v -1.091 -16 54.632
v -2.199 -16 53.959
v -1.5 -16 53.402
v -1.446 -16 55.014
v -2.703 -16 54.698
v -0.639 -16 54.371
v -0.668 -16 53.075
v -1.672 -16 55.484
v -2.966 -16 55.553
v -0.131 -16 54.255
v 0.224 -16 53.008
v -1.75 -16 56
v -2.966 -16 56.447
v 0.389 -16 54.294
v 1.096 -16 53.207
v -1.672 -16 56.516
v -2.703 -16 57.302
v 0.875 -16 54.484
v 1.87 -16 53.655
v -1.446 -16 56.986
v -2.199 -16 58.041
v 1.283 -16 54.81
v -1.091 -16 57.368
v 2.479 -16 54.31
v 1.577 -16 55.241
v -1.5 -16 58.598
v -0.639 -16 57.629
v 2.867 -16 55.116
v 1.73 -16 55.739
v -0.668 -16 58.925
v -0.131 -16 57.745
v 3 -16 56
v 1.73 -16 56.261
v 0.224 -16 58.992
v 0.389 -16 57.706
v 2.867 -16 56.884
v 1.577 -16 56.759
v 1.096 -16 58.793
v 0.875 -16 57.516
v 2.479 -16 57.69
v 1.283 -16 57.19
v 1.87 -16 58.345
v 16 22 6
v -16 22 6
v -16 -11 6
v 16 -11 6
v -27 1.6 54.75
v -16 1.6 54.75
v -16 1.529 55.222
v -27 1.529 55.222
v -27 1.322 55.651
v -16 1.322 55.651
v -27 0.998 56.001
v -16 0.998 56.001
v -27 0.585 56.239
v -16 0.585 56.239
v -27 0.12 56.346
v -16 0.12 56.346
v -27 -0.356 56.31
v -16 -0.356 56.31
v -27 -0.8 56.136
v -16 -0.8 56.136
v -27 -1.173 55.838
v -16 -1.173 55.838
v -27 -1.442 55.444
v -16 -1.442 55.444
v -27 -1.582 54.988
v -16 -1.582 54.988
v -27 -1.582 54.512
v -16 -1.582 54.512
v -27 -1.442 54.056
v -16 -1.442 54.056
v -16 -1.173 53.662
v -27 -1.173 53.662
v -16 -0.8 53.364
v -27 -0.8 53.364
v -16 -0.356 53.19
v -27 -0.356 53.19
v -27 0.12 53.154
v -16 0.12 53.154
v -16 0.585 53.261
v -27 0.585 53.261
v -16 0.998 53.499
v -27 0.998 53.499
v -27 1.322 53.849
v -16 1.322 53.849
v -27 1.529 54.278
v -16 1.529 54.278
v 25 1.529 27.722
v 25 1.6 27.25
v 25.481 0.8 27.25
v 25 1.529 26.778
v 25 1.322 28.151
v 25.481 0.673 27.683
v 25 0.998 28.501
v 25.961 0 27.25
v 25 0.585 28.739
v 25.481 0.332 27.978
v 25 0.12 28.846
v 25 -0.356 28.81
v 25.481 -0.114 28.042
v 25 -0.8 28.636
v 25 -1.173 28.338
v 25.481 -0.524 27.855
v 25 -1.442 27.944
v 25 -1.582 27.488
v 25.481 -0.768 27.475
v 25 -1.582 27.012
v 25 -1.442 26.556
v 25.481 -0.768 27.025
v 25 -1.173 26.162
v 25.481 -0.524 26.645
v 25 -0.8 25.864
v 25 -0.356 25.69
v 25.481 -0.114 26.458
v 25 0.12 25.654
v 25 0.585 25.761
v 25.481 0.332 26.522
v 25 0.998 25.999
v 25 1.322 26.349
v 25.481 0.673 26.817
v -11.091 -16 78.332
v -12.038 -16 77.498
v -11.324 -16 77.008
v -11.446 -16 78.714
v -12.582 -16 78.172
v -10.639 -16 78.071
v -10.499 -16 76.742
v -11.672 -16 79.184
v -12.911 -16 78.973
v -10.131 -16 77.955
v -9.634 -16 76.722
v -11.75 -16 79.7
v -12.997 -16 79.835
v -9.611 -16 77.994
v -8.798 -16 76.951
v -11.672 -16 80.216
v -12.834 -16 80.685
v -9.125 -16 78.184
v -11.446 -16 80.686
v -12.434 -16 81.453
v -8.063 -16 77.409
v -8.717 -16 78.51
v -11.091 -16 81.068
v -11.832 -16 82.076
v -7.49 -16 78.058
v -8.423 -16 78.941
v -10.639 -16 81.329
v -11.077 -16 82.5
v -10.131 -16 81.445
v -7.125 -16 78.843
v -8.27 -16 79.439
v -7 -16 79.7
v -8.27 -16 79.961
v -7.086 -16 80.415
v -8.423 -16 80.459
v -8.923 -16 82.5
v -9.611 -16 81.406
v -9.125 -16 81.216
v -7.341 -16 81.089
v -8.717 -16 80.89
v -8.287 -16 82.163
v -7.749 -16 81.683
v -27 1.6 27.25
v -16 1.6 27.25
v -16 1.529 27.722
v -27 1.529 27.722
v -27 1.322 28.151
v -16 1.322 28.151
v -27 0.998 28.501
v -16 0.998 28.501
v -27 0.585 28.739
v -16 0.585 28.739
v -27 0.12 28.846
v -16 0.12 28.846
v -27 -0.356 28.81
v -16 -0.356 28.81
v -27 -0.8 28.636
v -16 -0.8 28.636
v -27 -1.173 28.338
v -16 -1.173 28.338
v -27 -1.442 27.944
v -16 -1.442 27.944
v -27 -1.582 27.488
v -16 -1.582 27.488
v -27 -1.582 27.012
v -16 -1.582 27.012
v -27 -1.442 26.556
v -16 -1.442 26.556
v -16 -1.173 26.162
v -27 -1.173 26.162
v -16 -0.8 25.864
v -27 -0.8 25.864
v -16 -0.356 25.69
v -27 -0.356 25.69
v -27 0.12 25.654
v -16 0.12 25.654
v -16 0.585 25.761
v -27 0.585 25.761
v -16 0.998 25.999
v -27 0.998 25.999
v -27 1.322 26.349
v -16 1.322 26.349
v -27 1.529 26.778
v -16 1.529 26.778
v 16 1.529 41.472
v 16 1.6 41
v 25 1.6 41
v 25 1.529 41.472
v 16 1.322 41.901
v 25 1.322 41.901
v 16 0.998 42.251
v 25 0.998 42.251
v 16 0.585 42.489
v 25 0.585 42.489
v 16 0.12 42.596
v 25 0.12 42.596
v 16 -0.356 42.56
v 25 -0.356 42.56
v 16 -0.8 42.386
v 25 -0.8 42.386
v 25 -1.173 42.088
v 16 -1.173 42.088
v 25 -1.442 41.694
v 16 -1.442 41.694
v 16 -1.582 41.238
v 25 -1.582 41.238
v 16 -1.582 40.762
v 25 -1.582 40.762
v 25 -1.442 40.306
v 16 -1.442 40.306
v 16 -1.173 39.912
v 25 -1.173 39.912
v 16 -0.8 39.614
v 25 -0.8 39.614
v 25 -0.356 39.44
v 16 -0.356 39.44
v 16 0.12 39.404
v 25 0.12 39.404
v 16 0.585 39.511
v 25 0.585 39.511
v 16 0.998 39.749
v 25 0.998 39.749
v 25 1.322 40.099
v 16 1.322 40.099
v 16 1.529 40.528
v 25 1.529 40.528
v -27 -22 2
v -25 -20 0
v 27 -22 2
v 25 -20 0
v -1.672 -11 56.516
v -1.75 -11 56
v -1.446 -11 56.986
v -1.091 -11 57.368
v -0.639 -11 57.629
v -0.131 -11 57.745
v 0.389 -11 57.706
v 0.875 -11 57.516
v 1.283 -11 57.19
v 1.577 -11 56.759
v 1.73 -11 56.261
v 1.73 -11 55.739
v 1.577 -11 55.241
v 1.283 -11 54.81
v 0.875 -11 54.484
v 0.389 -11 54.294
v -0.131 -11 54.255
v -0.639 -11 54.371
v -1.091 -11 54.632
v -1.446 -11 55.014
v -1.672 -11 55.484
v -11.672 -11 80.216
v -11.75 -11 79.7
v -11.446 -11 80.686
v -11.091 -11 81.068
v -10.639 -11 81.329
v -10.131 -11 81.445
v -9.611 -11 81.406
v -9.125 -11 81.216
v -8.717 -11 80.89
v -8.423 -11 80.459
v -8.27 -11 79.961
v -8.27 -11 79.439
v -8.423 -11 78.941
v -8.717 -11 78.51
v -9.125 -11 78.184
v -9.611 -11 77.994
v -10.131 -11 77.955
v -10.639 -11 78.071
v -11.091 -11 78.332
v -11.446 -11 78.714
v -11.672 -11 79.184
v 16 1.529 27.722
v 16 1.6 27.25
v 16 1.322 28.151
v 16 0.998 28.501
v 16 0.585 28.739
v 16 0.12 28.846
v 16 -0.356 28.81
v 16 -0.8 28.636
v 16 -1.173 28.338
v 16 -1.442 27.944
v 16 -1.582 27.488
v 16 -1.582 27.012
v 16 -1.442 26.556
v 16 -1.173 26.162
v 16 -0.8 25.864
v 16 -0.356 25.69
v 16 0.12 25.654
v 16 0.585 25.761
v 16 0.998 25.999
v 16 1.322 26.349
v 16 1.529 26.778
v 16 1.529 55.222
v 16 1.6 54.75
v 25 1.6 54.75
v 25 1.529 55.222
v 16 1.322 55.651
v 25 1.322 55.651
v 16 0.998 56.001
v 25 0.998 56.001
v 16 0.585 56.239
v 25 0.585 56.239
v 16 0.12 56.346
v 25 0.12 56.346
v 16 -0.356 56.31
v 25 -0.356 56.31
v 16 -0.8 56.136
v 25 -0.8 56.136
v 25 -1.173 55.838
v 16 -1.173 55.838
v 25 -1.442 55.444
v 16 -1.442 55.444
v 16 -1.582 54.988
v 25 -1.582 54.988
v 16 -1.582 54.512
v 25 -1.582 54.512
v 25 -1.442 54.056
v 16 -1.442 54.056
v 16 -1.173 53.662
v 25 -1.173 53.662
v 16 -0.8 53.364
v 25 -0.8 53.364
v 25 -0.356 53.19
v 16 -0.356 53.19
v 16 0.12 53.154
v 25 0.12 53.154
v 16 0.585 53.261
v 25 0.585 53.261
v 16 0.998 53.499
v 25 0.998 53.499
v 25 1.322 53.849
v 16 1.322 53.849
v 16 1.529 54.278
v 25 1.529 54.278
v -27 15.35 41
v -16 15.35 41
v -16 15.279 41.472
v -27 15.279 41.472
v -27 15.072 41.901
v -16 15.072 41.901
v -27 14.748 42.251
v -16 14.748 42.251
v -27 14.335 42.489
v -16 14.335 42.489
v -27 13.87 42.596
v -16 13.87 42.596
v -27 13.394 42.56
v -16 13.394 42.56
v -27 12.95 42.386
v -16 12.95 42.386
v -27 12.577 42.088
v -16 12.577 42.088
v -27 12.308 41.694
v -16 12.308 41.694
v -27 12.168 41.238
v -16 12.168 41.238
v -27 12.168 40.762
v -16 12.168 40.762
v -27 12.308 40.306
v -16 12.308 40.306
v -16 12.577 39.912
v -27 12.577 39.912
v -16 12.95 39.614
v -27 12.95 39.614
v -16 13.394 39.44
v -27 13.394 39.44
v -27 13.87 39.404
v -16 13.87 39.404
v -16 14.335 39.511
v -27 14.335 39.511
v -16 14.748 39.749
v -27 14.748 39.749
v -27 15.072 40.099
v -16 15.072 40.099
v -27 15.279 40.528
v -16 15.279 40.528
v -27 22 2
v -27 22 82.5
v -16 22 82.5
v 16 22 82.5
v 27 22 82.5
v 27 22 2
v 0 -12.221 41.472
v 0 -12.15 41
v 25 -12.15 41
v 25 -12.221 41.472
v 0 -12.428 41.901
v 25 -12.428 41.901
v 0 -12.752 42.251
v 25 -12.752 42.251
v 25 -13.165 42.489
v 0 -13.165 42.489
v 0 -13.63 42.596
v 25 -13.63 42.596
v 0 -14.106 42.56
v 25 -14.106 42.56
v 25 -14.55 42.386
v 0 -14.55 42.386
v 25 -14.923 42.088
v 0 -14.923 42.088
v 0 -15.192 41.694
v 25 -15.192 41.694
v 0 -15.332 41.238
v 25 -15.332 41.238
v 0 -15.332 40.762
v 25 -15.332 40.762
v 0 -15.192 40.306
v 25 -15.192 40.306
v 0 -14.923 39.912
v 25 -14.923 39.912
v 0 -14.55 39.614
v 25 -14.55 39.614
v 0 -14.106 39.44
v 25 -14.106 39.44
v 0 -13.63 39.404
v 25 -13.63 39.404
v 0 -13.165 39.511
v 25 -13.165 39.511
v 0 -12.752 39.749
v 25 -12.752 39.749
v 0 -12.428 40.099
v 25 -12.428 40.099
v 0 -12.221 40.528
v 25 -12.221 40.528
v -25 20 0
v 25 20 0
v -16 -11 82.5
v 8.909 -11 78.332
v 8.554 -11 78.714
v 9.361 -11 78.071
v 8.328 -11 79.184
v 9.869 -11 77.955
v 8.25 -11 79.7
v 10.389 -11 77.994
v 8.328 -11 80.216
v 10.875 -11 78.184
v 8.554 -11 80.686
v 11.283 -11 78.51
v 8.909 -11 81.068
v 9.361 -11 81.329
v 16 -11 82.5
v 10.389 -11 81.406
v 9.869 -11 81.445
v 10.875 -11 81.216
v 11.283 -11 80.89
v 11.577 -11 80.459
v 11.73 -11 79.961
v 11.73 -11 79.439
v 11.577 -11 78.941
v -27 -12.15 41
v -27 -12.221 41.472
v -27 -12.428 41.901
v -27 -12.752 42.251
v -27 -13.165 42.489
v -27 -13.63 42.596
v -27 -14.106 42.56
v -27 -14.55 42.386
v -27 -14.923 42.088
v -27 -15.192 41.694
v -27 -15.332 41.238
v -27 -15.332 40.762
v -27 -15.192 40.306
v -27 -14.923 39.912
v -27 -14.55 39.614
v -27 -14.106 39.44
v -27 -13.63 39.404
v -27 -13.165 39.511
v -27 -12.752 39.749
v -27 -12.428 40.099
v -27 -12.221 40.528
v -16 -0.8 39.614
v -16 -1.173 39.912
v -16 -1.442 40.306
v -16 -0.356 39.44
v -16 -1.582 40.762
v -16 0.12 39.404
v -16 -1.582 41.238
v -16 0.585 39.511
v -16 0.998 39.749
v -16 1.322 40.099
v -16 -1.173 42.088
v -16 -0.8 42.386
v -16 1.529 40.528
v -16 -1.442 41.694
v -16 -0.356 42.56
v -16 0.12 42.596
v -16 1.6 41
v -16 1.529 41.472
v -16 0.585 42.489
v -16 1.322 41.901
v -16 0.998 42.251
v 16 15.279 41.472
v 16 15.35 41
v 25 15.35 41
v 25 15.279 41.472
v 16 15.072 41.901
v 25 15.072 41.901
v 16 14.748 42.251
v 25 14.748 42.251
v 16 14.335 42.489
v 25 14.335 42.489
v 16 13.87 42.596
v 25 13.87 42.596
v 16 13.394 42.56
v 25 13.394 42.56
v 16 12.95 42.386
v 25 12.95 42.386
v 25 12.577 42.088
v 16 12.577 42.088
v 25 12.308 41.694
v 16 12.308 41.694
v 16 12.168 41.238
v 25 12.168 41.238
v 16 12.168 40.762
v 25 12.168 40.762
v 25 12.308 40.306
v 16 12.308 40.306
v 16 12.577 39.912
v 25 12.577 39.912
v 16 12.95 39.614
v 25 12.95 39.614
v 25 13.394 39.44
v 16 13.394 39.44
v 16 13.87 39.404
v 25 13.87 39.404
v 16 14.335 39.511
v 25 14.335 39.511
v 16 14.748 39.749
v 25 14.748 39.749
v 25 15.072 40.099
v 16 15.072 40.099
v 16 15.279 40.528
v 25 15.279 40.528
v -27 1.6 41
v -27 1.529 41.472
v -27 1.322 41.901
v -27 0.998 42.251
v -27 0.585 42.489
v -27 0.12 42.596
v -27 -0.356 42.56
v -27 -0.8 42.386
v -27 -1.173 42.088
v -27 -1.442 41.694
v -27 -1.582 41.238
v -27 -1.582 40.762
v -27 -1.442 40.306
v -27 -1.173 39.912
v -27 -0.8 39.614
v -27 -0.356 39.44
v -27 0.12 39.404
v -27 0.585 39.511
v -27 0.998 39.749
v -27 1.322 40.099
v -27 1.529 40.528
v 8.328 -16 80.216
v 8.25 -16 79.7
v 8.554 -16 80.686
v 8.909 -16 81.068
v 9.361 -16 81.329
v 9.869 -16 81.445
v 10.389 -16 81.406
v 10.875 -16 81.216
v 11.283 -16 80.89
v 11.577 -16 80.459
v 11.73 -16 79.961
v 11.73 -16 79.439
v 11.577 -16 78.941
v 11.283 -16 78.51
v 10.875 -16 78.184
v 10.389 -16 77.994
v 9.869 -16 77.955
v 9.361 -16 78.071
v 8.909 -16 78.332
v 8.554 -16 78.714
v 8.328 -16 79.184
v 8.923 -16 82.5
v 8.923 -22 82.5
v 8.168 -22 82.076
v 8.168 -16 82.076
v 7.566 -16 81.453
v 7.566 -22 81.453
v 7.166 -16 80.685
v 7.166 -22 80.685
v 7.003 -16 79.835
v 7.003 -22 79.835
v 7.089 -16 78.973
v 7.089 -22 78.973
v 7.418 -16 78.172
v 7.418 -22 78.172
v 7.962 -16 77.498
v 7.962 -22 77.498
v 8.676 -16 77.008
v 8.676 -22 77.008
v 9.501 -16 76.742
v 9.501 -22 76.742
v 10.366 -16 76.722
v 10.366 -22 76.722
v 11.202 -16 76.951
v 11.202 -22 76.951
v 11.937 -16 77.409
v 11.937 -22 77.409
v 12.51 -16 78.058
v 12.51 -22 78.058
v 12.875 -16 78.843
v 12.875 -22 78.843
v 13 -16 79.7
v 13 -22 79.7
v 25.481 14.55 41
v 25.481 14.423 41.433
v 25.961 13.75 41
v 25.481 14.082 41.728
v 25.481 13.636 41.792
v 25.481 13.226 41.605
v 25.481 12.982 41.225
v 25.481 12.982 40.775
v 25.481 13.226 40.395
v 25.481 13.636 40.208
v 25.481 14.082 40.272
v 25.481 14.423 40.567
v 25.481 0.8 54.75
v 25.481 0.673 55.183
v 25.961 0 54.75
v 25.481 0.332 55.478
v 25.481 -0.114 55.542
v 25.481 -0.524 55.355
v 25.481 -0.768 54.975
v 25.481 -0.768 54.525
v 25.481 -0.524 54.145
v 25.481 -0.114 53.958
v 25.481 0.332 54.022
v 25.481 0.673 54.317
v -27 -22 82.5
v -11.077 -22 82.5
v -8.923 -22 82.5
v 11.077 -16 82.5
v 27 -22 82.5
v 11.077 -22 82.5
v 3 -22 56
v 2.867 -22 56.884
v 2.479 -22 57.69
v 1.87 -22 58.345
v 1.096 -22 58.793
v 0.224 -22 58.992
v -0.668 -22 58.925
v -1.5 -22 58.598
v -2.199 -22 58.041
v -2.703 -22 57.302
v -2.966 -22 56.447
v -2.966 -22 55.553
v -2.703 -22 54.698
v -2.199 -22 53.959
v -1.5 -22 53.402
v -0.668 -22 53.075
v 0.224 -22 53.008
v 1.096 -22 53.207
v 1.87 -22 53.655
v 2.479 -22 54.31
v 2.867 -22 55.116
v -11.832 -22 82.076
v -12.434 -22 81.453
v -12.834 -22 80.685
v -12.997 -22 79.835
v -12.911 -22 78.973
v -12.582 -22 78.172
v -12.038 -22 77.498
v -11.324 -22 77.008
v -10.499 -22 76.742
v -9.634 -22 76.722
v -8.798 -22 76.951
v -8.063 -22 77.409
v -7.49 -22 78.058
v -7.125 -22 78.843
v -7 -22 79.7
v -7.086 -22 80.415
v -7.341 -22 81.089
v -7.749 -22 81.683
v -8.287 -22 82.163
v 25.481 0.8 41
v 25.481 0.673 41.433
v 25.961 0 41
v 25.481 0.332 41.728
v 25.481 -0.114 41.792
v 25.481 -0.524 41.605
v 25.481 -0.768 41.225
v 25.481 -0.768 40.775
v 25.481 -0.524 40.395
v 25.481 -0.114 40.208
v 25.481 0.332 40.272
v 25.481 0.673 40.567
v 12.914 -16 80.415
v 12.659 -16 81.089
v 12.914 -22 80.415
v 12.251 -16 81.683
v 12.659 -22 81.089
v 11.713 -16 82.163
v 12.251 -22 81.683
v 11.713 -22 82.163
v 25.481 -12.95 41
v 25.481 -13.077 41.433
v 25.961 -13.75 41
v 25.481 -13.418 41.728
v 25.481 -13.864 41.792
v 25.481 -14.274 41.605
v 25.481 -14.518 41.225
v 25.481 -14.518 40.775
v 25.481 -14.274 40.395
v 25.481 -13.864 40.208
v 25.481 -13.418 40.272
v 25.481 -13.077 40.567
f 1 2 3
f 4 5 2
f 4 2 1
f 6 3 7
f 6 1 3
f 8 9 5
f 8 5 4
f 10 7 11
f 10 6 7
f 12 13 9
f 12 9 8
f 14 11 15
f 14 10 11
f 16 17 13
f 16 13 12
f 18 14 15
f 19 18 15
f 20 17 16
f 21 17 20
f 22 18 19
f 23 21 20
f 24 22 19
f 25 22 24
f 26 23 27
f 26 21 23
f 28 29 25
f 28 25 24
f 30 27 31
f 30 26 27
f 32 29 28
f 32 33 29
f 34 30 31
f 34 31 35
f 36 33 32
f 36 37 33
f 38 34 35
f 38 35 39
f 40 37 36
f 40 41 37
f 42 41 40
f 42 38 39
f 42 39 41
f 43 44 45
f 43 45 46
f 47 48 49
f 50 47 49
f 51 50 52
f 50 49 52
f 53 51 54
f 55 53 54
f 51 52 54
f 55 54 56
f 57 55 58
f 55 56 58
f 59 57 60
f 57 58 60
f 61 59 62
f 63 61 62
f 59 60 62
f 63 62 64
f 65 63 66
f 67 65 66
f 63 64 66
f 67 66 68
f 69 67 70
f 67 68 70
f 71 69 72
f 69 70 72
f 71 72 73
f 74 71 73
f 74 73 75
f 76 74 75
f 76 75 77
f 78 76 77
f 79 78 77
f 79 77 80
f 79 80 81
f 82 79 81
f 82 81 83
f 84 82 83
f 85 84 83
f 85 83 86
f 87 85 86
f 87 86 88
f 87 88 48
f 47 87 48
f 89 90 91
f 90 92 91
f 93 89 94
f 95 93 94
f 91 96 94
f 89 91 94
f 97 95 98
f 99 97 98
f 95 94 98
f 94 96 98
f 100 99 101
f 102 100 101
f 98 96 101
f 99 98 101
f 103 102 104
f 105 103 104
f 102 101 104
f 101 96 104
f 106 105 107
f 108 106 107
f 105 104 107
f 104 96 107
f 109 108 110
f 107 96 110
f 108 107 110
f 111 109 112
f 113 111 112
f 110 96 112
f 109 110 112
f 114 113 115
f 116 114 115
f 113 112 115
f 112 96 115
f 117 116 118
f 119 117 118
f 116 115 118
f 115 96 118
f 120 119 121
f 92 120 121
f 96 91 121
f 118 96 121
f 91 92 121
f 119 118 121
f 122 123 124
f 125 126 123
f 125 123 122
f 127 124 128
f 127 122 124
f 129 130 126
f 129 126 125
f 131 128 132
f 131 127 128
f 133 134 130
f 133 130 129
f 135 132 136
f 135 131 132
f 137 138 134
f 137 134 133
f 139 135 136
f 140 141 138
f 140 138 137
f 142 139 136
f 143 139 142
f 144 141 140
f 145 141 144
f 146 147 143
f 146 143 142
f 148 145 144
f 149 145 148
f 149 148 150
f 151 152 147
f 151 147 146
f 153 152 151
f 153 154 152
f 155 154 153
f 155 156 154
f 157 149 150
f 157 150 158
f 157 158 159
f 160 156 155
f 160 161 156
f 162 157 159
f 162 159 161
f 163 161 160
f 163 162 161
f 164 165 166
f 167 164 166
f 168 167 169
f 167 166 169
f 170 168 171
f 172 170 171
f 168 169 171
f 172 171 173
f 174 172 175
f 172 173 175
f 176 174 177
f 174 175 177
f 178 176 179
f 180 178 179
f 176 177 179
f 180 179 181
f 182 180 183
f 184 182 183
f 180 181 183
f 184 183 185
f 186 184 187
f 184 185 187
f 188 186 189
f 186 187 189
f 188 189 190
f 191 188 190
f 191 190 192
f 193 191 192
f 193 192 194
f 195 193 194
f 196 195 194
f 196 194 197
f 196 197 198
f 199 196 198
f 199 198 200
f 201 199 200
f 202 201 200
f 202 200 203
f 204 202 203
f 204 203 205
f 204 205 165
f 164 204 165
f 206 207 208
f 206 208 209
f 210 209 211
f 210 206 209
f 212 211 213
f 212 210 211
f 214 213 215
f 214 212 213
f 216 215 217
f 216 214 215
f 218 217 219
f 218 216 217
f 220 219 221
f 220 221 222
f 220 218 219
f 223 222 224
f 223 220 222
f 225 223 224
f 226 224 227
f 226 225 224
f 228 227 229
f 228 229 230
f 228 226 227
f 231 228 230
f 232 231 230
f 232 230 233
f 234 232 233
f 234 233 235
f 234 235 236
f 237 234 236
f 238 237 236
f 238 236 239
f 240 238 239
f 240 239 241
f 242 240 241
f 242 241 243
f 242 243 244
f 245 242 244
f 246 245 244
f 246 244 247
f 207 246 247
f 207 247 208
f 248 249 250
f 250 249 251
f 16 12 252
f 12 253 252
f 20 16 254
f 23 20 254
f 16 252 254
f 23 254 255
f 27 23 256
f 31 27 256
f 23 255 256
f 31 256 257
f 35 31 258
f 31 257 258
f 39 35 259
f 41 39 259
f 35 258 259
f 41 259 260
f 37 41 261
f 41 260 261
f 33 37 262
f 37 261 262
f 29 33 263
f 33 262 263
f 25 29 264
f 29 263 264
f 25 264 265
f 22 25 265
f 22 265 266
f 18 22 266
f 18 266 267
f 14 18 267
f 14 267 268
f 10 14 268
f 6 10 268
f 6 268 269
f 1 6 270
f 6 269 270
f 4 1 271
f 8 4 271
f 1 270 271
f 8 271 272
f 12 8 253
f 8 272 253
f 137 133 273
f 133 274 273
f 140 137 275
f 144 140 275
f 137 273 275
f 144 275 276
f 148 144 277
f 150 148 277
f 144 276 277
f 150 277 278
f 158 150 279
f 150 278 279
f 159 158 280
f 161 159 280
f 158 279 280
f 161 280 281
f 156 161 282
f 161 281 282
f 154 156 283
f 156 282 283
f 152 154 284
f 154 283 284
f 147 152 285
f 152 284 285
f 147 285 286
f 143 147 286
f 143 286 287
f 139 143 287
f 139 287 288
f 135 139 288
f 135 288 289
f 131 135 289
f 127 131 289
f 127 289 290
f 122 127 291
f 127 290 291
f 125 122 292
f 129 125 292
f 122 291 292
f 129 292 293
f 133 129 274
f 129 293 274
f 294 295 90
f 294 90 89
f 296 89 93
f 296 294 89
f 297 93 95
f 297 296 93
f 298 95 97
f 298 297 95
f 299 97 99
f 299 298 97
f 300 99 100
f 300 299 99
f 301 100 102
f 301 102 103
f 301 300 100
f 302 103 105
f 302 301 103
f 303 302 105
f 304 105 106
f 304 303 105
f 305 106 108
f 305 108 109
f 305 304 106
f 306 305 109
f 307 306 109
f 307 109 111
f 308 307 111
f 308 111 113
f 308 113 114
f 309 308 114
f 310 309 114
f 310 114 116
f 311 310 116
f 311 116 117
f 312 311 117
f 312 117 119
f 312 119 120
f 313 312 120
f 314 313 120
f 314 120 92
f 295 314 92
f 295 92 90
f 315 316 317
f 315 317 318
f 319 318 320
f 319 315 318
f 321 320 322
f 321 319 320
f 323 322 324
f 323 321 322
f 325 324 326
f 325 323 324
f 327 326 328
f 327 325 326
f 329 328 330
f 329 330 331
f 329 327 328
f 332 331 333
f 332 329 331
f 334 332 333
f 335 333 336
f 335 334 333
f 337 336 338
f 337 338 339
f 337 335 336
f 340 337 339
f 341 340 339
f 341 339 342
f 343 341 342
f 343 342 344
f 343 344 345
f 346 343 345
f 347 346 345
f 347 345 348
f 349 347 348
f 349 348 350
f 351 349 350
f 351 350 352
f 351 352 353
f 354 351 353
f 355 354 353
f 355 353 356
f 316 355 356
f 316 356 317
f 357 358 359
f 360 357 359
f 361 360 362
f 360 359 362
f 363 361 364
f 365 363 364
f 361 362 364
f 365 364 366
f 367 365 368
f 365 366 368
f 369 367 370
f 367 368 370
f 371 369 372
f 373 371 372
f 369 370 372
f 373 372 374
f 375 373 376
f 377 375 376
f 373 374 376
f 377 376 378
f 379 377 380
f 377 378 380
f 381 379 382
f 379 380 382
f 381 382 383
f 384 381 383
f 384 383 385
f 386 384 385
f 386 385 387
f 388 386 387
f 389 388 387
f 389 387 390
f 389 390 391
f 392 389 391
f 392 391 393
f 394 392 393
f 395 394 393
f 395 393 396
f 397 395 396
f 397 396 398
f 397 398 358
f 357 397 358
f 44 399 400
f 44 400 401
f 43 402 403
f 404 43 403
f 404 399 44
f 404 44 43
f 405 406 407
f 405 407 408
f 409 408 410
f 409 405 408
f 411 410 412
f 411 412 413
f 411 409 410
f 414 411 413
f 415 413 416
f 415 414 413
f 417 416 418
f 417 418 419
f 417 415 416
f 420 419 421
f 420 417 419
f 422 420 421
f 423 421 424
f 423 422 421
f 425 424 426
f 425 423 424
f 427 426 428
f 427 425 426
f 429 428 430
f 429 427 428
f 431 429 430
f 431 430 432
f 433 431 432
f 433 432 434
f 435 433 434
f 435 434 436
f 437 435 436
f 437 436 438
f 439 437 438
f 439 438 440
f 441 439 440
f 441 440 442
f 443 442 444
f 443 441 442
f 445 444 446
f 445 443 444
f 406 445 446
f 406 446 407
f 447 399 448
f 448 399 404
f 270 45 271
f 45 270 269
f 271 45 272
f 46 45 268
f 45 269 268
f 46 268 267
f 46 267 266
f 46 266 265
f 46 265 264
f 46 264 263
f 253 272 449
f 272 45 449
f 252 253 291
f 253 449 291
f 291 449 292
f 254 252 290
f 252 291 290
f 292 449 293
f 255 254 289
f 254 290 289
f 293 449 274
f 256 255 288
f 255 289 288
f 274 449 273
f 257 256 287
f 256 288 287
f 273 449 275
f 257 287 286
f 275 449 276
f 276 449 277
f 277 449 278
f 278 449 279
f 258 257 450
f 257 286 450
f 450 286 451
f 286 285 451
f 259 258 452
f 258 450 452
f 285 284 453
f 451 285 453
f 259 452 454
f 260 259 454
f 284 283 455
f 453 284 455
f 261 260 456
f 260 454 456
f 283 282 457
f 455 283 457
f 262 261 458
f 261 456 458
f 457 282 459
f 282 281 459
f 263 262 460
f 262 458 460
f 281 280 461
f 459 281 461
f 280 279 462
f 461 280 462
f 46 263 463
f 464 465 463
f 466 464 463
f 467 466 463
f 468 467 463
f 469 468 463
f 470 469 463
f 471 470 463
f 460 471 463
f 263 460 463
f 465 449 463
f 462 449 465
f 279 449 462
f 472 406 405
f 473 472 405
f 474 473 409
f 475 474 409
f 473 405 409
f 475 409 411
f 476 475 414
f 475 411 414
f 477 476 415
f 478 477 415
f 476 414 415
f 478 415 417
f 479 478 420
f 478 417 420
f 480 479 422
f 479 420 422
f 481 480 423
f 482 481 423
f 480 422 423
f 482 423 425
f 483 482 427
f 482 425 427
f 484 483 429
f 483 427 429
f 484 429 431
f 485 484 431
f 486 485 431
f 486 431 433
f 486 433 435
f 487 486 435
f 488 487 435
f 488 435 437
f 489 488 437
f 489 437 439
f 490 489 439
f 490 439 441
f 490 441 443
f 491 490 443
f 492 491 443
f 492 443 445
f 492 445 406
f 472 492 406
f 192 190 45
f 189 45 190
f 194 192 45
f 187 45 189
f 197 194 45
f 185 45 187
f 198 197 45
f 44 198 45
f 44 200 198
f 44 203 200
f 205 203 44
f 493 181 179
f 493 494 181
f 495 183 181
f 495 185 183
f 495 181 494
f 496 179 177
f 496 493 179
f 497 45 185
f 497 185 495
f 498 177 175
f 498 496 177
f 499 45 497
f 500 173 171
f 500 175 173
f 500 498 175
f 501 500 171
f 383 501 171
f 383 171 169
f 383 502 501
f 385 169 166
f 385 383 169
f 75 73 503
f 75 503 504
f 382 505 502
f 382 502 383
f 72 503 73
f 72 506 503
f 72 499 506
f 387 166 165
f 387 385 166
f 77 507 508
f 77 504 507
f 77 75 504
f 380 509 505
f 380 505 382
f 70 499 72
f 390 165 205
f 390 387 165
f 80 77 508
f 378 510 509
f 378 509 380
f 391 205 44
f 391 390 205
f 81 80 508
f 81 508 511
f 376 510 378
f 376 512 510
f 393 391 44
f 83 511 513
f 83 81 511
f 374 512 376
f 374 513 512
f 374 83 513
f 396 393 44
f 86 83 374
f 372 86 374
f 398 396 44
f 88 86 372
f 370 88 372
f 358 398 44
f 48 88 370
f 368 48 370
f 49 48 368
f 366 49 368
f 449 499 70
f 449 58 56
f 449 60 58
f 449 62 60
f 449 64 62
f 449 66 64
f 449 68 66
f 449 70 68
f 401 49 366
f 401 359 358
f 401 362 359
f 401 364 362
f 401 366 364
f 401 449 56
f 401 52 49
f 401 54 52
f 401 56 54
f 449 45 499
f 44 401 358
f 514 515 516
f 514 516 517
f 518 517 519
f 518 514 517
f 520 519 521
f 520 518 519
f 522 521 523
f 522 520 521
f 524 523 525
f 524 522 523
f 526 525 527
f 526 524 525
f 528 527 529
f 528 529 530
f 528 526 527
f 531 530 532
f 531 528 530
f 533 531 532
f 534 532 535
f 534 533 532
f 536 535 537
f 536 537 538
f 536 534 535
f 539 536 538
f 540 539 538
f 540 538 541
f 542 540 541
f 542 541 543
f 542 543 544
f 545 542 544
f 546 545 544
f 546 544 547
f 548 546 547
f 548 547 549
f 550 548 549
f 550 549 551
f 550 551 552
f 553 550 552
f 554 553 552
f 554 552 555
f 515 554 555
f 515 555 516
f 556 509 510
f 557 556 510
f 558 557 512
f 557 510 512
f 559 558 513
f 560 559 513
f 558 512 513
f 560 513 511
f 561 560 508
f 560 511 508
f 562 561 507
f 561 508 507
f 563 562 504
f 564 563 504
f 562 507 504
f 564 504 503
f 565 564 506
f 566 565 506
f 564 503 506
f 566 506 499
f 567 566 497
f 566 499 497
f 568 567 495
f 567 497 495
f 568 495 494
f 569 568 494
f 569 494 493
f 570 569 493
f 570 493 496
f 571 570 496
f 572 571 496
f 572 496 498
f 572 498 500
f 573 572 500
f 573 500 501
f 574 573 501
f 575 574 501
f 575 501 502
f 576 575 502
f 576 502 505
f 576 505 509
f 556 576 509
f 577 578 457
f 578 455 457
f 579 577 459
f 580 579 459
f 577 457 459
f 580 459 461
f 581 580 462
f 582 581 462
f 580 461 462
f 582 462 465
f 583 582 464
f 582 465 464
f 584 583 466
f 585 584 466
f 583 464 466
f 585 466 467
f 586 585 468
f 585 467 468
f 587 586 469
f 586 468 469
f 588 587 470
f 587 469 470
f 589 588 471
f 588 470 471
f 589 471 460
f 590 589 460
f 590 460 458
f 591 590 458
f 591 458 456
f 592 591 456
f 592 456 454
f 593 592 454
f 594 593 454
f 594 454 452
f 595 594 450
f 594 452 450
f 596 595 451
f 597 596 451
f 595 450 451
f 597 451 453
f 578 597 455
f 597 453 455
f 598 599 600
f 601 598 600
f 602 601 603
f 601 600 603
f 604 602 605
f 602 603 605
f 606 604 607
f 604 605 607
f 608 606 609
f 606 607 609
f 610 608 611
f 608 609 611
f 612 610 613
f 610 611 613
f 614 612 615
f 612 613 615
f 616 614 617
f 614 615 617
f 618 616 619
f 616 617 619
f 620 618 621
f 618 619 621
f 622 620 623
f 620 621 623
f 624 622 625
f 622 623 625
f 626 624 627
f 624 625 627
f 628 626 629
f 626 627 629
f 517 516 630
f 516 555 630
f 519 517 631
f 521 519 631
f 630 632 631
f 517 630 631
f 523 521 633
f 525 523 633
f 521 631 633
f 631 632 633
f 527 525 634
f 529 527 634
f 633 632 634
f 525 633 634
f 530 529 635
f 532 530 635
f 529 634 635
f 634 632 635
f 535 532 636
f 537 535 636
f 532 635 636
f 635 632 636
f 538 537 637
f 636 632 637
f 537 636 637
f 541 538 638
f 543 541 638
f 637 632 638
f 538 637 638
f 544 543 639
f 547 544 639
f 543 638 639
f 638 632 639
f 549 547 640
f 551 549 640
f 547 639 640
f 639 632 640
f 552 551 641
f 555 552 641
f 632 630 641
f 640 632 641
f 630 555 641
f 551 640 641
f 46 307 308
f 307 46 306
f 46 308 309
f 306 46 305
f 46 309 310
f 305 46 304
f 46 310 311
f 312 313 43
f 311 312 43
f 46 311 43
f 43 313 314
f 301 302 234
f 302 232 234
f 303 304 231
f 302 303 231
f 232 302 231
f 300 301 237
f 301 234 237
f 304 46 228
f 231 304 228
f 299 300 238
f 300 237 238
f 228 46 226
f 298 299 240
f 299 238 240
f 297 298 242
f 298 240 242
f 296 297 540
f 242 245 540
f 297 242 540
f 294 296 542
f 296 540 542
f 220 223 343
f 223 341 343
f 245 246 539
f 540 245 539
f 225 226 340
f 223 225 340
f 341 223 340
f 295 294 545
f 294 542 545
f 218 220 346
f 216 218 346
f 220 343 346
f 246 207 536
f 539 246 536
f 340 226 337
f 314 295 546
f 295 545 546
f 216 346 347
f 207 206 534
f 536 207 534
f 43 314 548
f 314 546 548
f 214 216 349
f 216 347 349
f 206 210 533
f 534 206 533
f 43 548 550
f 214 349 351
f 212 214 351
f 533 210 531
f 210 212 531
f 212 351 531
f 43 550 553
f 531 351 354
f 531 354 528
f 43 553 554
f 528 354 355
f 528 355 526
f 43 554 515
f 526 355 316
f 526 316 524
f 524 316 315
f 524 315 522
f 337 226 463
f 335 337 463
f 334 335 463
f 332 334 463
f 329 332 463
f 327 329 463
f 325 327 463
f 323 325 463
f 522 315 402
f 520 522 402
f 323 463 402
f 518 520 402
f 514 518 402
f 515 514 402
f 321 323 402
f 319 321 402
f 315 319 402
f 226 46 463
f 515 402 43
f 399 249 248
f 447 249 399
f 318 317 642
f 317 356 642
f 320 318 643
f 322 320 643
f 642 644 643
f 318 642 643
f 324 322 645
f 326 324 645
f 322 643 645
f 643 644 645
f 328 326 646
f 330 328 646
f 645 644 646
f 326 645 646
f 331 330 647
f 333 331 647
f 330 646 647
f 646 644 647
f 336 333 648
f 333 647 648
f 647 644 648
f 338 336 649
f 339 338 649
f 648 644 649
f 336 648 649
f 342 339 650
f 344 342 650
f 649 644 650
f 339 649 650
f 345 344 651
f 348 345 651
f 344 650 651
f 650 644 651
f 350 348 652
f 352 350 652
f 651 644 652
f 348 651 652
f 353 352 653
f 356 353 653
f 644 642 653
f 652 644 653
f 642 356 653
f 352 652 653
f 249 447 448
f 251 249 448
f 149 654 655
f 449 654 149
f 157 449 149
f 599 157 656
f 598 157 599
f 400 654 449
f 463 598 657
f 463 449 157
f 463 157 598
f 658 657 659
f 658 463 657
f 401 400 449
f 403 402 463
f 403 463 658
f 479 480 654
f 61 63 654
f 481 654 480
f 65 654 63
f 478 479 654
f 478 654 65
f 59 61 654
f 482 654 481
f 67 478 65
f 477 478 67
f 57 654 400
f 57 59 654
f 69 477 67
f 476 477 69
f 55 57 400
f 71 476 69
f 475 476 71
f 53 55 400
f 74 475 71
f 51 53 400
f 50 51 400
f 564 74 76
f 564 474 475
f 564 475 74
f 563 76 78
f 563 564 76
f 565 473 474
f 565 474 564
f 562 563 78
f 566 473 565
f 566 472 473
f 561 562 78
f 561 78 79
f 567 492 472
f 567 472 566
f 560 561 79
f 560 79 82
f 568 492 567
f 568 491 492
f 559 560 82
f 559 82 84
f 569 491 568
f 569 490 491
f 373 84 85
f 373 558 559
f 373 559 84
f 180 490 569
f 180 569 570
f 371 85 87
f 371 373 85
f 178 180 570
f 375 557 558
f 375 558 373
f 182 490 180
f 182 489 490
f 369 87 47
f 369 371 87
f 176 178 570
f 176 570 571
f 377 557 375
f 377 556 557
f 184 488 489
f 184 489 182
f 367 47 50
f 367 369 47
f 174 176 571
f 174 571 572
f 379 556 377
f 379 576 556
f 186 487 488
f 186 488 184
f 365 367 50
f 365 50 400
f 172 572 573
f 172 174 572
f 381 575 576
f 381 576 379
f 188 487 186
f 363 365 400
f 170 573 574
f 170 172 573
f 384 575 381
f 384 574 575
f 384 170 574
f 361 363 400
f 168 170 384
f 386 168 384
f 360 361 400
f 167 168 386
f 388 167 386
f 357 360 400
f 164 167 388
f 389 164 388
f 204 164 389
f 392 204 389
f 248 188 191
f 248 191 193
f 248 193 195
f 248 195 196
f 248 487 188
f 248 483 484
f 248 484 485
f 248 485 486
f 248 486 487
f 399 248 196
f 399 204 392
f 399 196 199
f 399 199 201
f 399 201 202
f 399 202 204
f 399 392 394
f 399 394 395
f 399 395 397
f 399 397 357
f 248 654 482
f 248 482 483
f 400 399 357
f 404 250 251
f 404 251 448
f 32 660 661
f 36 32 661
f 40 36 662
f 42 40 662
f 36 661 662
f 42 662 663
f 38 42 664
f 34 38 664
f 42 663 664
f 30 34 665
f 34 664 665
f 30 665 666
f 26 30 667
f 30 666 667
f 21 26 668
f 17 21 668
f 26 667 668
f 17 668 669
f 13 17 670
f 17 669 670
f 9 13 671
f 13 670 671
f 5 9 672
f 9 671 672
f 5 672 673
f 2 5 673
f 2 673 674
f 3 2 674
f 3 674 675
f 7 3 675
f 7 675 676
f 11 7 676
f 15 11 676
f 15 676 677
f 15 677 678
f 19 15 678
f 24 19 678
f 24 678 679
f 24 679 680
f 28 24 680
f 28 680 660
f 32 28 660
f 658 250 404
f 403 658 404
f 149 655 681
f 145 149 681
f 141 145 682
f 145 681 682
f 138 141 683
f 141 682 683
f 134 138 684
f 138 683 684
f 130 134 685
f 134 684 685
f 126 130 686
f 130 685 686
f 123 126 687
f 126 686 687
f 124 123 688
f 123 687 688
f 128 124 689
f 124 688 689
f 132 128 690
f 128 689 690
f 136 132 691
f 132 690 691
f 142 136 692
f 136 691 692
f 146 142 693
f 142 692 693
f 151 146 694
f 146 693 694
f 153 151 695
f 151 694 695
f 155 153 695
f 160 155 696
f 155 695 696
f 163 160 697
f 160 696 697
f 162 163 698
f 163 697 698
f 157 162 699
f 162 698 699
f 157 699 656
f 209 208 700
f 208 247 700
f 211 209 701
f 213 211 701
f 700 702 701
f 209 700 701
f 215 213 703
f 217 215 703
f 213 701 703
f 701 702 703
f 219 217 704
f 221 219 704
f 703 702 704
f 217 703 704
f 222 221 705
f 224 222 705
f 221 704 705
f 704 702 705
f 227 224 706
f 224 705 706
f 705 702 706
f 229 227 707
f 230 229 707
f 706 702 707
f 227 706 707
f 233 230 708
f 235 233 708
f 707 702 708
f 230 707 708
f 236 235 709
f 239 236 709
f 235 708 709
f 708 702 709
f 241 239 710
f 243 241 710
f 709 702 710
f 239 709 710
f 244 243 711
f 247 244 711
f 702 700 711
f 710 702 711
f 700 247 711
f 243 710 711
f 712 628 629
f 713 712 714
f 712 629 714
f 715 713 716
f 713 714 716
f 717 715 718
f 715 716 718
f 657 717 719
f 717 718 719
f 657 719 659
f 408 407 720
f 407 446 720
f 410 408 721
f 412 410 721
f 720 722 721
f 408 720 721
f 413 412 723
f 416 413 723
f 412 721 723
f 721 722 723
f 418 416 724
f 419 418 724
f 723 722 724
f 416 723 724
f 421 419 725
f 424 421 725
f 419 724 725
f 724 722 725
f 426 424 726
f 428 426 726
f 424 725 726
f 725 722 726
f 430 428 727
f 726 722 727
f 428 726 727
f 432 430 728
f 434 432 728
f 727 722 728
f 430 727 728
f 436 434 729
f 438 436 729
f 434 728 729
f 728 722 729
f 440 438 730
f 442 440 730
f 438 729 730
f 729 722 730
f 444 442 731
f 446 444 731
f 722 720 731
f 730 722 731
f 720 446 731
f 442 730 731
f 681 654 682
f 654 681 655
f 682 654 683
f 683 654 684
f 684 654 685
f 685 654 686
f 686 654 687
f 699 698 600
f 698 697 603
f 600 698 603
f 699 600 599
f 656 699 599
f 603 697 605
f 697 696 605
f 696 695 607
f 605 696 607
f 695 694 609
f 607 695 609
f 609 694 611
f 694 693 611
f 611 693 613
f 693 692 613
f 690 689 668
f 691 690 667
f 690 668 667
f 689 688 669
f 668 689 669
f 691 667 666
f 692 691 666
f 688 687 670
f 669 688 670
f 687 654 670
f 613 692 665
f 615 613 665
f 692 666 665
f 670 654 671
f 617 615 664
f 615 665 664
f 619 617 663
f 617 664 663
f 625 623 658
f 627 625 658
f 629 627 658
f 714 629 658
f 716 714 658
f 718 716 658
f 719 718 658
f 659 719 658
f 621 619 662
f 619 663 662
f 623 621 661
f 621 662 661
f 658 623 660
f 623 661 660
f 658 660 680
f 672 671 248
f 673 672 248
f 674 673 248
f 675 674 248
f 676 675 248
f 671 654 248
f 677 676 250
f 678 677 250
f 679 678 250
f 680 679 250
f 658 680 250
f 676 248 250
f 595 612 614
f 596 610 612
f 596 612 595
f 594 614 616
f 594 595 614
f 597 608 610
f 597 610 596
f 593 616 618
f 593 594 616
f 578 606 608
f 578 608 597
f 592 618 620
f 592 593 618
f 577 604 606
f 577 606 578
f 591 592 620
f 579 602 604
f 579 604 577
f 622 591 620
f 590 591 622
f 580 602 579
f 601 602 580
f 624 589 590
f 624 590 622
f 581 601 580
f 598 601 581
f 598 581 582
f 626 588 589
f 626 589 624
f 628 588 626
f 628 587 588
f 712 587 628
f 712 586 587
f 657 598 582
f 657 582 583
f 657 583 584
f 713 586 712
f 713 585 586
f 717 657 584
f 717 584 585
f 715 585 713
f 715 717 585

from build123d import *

# Parameters (mm, degrees)
SKETCH_W            = 54
SKETCH_H            = 44
PAD_DEPTH           = 82.5
SKETCH001_W         = 32
SKETCH001_H         = 44
POCKET_DEPTH        = 76.5
SKETCH002_R         = 1.6
HOLE_DEPTH          = 50
HOLE001_DEPTH       = 25
HOLE001_TIPS_R      = 1.6
SKETCH003_R         = 1
HOLE002_DEPTH       = 12
HOLE003_D           = 3.5
HOLE003_DEPTH       = 25
HOLE003_CBORE_D     = 6
HOLE003_CBORE_DEPTH = 6
HOLE003_TIPS_R      = 1.75
CHAMFER_SIZE        = 2


with BuildPart() as part:
    # Sketch → Pad (new body)
    with BuildSketch(Plane.XY):
        Rectangle(SKETCH_W, SKETCH_H)
    extrude(amount=PAD_DEPTH)

    # Sketch001 (on Face6 of Pad) → Pocket (cut)
    with BuildSketch(Plane.XY.offset(82.5)):
        with Locations((0, 11)):
            Rectangle(SKETCH001_W, SKETCH001_H)
    extrude(amount=-POCKET_DEPTH, mode=Mode.SUBTRACT)

    # Sketch002 → Hole (cut)
    with BuildSketch(Plane.YZ):
        with Locations((0, 41)):
            Circle(SKETCH002_R)
        with Locations((13.75, 41)):
            Circle(SKETCH002_R)
        with Locations((0, 54.75)):
            Circle(SKETCH002_R)
        with Locations((0, 27.25)):
            Circle(SKETCH002_R)
        with Locations((-13.75, 41)):
            Circle(SKETCH002_R)
    extrude(amount=-HOLE_DEPTH, mode=Mode.SUBTRACT)

    # Sketch002 → Hole001 (cut)
    with BuildSketch(Plane.YZ):
        with Locations((0, 41)):
            Circle(SKETCH002_R)
        with Locations((13.75, 41)):
            Circle(SKETCH002_R)
        with Locations((0, 54.75)):
            Circle(SKETCH002_R)
        with Locations((0, 27.25)):
            Circle(SKETCH002_R)
        with Locations((-13.75, 41)):
            Circle(SKETCH002_R)
    extrude(amount=HOLE001_DEPTH, mode=Mode.SUBTRACT)

    # Hole001 tips → Hole001 tip 1 section 0
    with BuildSketch(Plane.YZ.offset(25), mode=Mode.PRIVATE) as hole001_tip_1_s0:
        with Locations((0, 41)):
            Circle(HOLE001_TIPS_R)
    loft([hole001_tip_1_s0.sketch, Vertex(25.961377, 0, 41)], mode=Mode.SUBTRACT)

    # Hole001 tips → Hole001 tip 2 section 0
    with BuildSketch(Plane.YZ.offset(25), mode=Mode.PRIVATE) as hole001_tip_2_s0:
        with Locations((13.75, 41)):
            Circle(HOLE001_TIPS_R)
    loft([hole001_tip_2_s0.sketch, Vertex(25.961377, 13.75, 41)], mode=Mode.SUBTRACT)

    # Hole001 tips → Hole001 tip 3 section 0
    with BuildSketch(Plane.YZ.offset(25), mode=Mode.PRIVATE) as hole001_tip_3_s0:
        with Locations((0, 54.75)):
            Circle(HOLE001_TIPS_R)
    loft([hole001_tip_3_s0.sketch, Vertex(25.961377, 0, 54.75)], mode=Mode.SUBTRACT)

    # Hole001 tips → Hole001 tip 4 section 0
    with BuildSketch(Plane.YZ.offset(25), mode=Mode.PRIVATE) as hole001_tip_4_s0:
        with Locations((0, 27.25)):
            Circle(HOLE001_TIPS_R)
    loft([hole001_tip_4_s0.sketch, Vertex(25.961377, 0, 27.25)], mode=Mode.SUBTRACT)

    # Hole001 tips → Hole001 tip 5 section 0
    with BuildSketch(Plane.YZ.offset(25), mode=Mode.PRIVATE) as hole001_tip_5_s0:
        with Locations((-13.75, 41)):
            Circle(HOLE001_TIPS_R)
    loft([hole001_tip_5_s0.sketch, Vertex(25.961377, -13.75, 41)], mode=Mode.SUBTRACT)

    # Sketch003 → Hole002 (cut)
    with BuildSketch(Plane.XY):
        with Locations((-13, 18.5)):
            Circle(SKETCH003_R)
        with Locations((13, 18.5)):
            Circle(SKETCH003_R)
        with Locations((13, -18.5)):
            Circle(SKETCH003_R)
        with Locations((-13, -18.5)):
            Circle(SKETCH003_R)
    extrude(amount=-HOLE002_DEPTH, mode=Mode.SUBTRACT)

    # Hole003
    with Locations(Plane.XZ.offset(22)):
        with Locations((0, 56), (10, 79.7), (-10, 79.7)):
            CounterBoreHole(HOLE003_D / 2, HOLE003_CBORE_D / 2, HOLE003_CBORE_DEPTH, depth=HOLE003_DEPTH)

    # Hole003 tips → Hole003 tip 1 section 0
    with BuildSketch(Plane.XZ.offset(-3), mode=Mode.PRIVATE) as hole003_tip_1_s0:
        with Locations((0, 56)):
            Circle(HOLE003_TIPS_R)
    loft([hole003_tip_1_s0.sketch, Vertex(0, 4.051506, 56)], mode=Mode.SUBTRACT)

    # Hole003 tips → Hole003 tip 2 section 0
    with BuildSketch(Plane.XZ.offset(-3), mode=Mode.PRIVATE) as hole003_tip_2_s0:
        with Locations((10, 79.7)):
            Circle(HOLE003_TIPS_R)
    loft([hole003_tip_2_s0.sketch, Vertex(10, 4.051506, 79.7)], mode=Mode.SUBTRACT)

    # Hole003 tips → Hole003 tip 3 section 0
    with BuildSketch(Plane.XZ.offset(-3), mode=Mode.PRIVATE) as hole003_tip_3_s0:
        with Locations((-10, 79.7)):
            Circle(HOLE003_TIPS_R)
    loft([hole003_tip_3_s0.sketch, Vertex(-10, 4.051506, 79.7)], mode=Mode.SUBTRACT)

    # Chamfer
    chamfer_edges = [part.edges().sort_by_distance(p)[0] for p in [
        (-27, 0, 0),
        (0, 22, 0),
        (27, 0, 0),
        (0, -22, 0),
    ]]
    chamfer(chamfer_edges, length=CHAMFER_SIZE)


solid = part.part
